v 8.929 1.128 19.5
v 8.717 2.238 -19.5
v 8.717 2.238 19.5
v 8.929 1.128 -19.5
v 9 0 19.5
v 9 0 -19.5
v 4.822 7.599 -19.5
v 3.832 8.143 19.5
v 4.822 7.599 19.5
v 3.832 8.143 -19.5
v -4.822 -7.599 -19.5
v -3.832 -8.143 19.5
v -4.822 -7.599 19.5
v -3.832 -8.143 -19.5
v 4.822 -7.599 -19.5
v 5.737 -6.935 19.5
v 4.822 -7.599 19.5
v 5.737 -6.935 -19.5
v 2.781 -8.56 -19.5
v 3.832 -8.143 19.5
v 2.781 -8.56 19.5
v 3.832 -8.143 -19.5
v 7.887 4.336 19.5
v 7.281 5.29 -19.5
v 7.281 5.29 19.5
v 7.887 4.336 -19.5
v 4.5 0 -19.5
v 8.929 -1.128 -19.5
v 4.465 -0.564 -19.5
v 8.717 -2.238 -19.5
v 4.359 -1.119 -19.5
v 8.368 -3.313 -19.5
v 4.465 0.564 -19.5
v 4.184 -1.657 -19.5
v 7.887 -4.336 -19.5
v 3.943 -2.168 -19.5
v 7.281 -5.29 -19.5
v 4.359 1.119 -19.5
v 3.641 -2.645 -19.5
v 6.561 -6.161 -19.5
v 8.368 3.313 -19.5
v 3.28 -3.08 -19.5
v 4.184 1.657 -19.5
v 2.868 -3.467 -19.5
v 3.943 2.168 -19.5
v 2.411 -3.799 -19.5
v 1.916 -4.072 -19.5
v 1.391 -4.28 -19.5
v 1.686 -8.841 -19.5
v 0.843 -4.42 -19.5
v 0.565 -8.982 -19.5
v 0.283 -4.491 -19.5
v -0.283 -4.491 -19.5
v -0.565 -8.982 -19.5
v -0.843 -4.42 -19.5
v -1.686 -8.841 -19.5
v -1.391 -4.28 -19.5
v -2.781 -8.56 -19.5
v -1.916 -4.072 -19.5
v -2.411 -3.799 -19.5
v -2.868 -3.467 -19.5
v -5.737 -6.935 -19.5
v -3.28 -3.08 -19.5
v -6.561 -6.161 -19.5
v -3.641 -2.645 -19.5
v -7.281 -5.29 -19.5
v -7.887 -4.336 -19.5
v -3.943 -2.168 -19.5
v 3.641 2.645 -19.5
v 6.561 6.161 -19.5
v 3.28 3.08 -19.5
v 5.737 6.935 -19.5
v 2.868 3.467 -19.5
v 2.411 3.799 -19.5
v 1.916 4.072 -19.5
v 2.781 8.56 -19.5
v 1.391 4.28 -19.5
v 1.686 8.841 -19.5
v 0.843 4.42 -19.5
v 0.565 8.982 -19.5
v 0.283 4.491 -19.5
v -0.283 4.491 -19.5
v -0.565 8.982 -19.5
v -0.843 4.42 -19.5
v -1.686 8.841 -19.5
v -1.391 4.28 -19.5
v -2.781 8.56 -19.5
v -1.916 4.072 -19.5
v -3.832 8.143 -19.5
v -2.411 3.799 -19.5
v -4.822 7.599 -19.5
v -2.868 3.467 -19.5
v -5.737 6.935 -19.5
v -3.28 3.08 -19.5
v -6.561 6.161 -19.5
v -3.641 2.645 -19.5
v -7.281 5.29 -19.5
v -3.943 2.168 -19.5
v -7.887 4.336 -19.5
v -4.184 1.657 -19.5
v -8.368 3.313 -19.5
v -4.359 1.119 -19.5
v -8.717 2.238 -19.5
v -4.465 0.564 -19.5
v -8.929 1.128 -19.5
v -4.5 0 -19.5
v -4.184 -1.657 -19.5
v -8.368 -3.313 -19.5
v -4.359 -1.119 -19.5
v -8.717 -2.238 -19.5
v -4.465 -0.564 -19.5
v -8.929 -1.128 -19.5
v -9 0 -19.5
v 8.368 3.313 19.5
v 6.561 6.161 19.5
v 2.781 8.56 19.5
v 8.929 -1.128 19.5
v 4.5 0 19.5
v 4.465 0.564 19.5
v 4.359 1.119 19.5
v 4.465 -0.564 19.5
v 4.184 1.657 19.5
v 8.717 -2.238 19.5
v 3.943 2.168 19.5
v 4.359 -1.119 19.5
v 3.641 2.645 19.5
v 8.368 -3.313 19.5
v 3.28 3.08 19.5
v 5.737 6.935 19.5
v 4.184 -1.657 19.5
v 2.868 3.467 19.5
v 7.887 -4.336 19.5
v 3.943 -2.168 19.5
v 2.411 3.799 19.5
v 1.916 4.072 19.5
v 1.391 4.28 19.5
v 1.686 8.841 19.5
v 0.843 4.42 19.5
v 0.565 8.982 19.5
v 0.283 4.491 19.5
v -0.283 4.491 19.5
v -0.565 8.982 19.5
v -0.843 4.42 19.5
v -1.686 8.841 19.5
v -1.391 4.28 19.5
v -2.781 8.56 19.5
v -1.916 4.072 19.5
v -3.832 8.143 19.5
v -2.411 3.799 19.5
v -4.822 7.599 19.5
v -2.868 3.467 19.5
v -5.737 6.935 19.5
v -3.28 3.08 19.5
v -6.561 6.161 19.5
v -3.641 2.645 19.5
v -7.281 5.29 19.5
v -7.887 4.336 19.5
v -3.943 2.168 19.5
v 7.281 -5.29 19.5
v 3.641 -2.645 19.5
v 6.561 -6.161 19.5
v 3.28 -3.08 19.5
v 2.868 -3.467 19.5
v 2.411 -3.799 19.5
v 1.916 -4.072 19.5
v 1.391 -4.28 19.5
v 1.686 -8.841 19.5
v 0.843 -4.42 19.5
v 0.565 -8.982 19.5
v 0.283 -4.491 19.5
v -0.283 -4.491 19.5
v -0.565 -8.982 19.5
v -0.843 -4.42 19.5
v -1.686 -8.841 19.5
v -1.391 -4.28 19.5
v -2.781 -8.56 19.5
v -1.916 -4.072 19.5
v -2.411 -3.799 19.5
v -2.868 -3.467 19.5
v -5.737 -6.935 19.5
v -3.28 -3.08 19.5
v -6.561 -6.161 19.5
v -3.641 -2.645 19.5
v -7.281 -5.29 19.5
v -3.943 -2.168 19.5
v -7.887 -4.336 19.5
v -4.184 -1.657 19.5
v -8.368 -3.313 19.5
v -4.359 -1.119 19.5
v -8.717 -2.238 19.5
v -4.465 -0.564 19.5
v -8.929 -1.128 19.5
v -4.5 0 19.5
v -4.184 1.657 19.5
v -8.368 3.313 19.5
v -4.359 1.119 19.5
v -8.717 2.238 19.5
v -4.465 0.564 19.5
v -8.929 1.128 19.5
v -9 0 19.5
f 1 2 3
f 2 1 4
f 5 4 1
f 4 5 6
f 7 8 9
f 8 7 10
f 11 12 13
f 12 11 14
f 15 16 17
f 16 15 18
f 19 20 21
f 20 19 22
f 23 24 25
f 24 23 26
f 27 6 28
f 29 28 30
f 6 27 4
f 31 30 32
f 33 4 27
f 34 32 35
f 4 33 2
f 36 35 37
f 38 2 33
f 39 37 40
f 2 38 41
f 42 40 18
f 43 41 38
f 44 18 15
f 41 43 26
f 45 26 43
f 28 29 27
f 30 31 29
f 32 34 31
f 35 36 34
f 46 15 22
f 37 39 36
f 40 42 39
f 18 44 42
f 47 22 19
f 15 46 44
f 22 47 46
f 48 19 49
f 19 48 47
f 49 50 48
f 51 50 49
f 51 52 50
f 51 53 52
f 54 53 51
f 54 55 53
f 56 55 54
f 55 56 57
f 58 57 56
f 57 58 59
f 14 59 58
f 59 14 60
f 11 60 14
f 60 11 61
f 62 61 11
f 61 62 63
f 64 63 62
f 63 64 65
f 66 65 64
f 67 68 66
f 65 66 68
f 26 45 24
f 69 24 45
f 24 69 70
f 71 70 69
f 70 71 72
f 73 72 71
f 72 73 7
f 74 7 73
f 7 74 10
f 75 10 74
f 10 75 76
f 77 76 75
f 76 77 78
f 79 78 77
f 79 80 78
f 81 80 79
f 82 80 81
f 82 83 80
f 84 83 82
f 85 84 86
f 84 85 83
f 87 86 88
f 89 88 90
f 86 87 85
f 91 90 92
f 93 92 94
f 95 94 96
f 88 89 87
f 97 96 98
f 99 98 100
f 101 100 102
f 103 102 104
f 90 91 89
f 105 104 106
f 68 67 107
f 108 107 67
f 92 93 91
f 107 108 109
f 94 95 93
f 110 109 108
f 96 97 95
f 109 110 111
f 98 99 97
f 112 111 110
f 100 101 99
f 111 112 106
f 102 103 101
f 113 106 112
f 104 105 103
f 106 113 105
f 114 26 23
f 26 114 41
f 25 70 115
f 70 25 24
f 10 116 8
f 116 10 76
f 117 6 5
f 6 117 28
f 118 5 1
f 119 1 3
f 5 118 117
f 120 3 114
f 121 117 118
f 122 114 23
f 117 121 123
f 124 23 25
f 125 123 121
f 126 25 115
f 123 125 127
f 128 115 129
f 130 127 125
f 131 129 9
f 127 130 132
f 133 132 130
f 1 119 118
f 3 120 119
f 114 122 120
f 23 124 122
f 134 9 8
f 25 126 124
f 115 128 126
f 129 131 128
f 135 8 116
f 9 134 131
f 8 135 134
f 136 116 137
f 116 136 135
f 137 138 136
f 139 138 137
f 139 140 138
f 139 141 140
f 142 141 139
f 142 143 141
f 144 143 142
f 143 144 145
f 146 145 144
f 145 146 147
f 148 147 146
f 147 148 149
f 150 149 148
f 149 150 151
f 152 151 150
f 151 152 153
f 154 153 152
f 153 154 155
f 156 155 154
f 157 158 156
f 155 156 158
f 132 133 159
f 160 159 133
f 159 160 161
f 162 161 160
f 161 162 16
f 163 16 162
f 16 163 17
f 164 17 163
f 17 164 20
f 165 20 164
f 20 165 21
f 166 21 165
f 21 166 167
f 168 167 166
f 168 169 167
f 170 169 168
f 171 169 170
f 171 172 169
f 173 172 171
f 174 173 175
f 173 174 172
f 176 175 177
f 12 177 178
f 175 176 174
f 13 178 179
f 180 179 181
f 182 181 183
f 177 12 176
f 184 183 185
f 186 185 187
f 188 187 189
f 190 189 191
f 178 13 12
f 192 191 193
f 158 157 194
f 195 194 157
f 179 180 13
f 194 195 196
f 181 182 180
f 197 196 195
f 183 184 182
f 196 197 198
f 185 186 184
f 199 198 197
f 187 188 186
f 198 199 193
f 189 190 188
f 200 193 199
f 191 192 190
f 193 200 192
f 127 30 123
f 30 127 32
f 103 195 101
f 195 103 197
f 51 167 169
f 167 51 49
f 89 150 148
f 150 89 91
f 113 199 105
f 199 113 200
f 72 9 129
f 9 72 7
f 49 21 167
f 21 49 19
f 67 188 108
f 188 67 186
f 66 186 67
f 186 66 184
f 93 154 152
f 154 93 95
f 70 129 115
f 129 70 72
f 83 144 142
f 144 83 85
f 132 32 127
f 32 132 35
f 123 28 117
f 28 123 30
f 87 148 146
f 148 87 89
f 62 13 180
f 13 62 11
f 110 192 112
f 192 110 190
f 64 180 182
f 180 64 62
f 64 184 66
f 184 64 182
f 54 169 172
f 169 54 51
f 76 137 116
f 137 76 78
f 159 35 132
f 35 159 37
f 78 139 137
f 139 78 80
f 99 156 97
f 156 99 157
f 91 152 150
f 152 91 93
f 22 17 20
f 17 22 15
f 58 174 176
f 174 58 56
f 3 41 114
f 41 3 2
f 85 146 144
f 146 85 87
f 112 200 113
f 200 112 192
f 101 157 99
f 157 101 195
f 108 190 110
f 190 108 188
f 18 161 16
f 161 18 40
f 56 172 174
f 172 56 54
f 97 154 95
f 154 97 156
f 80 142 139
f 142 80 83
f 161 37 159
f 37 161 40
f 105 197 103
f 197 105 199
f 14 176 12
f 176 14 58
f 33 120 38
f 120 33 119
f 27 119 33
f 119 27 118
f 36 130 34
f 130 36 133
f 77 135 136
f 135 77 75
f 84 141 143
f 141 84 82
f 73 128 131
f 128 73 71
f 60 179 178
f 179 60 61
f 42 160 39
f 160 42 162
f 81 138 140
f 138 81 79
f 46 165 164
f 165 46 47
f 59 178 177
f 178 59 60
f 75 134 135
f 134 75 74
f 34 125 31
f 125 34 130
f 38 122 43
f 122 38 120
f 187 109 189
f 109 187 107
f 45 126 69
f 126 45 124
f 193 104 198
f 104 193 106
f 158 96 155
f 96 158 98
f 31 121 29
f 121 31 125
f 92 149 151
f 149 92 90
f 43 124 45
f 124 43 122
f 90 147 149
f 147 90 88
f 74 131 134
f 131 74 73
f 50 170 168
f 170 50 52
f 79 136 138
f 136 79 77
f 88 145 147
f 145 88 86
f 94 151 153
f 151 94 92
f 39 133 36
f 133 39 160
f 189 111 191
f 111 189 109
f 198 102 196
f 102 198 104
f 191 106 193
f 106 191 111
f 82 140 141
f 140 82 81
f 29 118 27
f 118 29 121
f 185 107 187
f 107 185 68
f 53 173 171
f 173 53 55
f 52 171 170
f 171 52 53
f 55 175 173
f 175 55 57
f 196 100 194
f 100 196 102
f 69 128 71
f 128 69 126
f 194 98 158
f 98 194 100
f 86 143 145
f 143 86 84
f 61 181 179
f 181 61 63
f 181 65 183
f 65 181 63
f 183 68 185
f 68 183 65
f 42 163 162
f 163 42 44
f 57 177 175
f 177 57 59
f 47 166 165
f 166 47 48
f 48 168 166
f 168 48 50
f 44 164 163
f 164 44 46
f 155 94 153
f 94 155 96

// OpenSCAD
$fn = 50;


difference() {
	union() {
		translate(v = [0, 0, -19.5000000000]) {
			cylinder(h = 39, r = 9.0000000000);
		}
	}
	union() {
		translate(v = [0, 0, -100.0000000000]) {
			cylinder(h = 200, r = 4.5000000000);
		}
	}
}
